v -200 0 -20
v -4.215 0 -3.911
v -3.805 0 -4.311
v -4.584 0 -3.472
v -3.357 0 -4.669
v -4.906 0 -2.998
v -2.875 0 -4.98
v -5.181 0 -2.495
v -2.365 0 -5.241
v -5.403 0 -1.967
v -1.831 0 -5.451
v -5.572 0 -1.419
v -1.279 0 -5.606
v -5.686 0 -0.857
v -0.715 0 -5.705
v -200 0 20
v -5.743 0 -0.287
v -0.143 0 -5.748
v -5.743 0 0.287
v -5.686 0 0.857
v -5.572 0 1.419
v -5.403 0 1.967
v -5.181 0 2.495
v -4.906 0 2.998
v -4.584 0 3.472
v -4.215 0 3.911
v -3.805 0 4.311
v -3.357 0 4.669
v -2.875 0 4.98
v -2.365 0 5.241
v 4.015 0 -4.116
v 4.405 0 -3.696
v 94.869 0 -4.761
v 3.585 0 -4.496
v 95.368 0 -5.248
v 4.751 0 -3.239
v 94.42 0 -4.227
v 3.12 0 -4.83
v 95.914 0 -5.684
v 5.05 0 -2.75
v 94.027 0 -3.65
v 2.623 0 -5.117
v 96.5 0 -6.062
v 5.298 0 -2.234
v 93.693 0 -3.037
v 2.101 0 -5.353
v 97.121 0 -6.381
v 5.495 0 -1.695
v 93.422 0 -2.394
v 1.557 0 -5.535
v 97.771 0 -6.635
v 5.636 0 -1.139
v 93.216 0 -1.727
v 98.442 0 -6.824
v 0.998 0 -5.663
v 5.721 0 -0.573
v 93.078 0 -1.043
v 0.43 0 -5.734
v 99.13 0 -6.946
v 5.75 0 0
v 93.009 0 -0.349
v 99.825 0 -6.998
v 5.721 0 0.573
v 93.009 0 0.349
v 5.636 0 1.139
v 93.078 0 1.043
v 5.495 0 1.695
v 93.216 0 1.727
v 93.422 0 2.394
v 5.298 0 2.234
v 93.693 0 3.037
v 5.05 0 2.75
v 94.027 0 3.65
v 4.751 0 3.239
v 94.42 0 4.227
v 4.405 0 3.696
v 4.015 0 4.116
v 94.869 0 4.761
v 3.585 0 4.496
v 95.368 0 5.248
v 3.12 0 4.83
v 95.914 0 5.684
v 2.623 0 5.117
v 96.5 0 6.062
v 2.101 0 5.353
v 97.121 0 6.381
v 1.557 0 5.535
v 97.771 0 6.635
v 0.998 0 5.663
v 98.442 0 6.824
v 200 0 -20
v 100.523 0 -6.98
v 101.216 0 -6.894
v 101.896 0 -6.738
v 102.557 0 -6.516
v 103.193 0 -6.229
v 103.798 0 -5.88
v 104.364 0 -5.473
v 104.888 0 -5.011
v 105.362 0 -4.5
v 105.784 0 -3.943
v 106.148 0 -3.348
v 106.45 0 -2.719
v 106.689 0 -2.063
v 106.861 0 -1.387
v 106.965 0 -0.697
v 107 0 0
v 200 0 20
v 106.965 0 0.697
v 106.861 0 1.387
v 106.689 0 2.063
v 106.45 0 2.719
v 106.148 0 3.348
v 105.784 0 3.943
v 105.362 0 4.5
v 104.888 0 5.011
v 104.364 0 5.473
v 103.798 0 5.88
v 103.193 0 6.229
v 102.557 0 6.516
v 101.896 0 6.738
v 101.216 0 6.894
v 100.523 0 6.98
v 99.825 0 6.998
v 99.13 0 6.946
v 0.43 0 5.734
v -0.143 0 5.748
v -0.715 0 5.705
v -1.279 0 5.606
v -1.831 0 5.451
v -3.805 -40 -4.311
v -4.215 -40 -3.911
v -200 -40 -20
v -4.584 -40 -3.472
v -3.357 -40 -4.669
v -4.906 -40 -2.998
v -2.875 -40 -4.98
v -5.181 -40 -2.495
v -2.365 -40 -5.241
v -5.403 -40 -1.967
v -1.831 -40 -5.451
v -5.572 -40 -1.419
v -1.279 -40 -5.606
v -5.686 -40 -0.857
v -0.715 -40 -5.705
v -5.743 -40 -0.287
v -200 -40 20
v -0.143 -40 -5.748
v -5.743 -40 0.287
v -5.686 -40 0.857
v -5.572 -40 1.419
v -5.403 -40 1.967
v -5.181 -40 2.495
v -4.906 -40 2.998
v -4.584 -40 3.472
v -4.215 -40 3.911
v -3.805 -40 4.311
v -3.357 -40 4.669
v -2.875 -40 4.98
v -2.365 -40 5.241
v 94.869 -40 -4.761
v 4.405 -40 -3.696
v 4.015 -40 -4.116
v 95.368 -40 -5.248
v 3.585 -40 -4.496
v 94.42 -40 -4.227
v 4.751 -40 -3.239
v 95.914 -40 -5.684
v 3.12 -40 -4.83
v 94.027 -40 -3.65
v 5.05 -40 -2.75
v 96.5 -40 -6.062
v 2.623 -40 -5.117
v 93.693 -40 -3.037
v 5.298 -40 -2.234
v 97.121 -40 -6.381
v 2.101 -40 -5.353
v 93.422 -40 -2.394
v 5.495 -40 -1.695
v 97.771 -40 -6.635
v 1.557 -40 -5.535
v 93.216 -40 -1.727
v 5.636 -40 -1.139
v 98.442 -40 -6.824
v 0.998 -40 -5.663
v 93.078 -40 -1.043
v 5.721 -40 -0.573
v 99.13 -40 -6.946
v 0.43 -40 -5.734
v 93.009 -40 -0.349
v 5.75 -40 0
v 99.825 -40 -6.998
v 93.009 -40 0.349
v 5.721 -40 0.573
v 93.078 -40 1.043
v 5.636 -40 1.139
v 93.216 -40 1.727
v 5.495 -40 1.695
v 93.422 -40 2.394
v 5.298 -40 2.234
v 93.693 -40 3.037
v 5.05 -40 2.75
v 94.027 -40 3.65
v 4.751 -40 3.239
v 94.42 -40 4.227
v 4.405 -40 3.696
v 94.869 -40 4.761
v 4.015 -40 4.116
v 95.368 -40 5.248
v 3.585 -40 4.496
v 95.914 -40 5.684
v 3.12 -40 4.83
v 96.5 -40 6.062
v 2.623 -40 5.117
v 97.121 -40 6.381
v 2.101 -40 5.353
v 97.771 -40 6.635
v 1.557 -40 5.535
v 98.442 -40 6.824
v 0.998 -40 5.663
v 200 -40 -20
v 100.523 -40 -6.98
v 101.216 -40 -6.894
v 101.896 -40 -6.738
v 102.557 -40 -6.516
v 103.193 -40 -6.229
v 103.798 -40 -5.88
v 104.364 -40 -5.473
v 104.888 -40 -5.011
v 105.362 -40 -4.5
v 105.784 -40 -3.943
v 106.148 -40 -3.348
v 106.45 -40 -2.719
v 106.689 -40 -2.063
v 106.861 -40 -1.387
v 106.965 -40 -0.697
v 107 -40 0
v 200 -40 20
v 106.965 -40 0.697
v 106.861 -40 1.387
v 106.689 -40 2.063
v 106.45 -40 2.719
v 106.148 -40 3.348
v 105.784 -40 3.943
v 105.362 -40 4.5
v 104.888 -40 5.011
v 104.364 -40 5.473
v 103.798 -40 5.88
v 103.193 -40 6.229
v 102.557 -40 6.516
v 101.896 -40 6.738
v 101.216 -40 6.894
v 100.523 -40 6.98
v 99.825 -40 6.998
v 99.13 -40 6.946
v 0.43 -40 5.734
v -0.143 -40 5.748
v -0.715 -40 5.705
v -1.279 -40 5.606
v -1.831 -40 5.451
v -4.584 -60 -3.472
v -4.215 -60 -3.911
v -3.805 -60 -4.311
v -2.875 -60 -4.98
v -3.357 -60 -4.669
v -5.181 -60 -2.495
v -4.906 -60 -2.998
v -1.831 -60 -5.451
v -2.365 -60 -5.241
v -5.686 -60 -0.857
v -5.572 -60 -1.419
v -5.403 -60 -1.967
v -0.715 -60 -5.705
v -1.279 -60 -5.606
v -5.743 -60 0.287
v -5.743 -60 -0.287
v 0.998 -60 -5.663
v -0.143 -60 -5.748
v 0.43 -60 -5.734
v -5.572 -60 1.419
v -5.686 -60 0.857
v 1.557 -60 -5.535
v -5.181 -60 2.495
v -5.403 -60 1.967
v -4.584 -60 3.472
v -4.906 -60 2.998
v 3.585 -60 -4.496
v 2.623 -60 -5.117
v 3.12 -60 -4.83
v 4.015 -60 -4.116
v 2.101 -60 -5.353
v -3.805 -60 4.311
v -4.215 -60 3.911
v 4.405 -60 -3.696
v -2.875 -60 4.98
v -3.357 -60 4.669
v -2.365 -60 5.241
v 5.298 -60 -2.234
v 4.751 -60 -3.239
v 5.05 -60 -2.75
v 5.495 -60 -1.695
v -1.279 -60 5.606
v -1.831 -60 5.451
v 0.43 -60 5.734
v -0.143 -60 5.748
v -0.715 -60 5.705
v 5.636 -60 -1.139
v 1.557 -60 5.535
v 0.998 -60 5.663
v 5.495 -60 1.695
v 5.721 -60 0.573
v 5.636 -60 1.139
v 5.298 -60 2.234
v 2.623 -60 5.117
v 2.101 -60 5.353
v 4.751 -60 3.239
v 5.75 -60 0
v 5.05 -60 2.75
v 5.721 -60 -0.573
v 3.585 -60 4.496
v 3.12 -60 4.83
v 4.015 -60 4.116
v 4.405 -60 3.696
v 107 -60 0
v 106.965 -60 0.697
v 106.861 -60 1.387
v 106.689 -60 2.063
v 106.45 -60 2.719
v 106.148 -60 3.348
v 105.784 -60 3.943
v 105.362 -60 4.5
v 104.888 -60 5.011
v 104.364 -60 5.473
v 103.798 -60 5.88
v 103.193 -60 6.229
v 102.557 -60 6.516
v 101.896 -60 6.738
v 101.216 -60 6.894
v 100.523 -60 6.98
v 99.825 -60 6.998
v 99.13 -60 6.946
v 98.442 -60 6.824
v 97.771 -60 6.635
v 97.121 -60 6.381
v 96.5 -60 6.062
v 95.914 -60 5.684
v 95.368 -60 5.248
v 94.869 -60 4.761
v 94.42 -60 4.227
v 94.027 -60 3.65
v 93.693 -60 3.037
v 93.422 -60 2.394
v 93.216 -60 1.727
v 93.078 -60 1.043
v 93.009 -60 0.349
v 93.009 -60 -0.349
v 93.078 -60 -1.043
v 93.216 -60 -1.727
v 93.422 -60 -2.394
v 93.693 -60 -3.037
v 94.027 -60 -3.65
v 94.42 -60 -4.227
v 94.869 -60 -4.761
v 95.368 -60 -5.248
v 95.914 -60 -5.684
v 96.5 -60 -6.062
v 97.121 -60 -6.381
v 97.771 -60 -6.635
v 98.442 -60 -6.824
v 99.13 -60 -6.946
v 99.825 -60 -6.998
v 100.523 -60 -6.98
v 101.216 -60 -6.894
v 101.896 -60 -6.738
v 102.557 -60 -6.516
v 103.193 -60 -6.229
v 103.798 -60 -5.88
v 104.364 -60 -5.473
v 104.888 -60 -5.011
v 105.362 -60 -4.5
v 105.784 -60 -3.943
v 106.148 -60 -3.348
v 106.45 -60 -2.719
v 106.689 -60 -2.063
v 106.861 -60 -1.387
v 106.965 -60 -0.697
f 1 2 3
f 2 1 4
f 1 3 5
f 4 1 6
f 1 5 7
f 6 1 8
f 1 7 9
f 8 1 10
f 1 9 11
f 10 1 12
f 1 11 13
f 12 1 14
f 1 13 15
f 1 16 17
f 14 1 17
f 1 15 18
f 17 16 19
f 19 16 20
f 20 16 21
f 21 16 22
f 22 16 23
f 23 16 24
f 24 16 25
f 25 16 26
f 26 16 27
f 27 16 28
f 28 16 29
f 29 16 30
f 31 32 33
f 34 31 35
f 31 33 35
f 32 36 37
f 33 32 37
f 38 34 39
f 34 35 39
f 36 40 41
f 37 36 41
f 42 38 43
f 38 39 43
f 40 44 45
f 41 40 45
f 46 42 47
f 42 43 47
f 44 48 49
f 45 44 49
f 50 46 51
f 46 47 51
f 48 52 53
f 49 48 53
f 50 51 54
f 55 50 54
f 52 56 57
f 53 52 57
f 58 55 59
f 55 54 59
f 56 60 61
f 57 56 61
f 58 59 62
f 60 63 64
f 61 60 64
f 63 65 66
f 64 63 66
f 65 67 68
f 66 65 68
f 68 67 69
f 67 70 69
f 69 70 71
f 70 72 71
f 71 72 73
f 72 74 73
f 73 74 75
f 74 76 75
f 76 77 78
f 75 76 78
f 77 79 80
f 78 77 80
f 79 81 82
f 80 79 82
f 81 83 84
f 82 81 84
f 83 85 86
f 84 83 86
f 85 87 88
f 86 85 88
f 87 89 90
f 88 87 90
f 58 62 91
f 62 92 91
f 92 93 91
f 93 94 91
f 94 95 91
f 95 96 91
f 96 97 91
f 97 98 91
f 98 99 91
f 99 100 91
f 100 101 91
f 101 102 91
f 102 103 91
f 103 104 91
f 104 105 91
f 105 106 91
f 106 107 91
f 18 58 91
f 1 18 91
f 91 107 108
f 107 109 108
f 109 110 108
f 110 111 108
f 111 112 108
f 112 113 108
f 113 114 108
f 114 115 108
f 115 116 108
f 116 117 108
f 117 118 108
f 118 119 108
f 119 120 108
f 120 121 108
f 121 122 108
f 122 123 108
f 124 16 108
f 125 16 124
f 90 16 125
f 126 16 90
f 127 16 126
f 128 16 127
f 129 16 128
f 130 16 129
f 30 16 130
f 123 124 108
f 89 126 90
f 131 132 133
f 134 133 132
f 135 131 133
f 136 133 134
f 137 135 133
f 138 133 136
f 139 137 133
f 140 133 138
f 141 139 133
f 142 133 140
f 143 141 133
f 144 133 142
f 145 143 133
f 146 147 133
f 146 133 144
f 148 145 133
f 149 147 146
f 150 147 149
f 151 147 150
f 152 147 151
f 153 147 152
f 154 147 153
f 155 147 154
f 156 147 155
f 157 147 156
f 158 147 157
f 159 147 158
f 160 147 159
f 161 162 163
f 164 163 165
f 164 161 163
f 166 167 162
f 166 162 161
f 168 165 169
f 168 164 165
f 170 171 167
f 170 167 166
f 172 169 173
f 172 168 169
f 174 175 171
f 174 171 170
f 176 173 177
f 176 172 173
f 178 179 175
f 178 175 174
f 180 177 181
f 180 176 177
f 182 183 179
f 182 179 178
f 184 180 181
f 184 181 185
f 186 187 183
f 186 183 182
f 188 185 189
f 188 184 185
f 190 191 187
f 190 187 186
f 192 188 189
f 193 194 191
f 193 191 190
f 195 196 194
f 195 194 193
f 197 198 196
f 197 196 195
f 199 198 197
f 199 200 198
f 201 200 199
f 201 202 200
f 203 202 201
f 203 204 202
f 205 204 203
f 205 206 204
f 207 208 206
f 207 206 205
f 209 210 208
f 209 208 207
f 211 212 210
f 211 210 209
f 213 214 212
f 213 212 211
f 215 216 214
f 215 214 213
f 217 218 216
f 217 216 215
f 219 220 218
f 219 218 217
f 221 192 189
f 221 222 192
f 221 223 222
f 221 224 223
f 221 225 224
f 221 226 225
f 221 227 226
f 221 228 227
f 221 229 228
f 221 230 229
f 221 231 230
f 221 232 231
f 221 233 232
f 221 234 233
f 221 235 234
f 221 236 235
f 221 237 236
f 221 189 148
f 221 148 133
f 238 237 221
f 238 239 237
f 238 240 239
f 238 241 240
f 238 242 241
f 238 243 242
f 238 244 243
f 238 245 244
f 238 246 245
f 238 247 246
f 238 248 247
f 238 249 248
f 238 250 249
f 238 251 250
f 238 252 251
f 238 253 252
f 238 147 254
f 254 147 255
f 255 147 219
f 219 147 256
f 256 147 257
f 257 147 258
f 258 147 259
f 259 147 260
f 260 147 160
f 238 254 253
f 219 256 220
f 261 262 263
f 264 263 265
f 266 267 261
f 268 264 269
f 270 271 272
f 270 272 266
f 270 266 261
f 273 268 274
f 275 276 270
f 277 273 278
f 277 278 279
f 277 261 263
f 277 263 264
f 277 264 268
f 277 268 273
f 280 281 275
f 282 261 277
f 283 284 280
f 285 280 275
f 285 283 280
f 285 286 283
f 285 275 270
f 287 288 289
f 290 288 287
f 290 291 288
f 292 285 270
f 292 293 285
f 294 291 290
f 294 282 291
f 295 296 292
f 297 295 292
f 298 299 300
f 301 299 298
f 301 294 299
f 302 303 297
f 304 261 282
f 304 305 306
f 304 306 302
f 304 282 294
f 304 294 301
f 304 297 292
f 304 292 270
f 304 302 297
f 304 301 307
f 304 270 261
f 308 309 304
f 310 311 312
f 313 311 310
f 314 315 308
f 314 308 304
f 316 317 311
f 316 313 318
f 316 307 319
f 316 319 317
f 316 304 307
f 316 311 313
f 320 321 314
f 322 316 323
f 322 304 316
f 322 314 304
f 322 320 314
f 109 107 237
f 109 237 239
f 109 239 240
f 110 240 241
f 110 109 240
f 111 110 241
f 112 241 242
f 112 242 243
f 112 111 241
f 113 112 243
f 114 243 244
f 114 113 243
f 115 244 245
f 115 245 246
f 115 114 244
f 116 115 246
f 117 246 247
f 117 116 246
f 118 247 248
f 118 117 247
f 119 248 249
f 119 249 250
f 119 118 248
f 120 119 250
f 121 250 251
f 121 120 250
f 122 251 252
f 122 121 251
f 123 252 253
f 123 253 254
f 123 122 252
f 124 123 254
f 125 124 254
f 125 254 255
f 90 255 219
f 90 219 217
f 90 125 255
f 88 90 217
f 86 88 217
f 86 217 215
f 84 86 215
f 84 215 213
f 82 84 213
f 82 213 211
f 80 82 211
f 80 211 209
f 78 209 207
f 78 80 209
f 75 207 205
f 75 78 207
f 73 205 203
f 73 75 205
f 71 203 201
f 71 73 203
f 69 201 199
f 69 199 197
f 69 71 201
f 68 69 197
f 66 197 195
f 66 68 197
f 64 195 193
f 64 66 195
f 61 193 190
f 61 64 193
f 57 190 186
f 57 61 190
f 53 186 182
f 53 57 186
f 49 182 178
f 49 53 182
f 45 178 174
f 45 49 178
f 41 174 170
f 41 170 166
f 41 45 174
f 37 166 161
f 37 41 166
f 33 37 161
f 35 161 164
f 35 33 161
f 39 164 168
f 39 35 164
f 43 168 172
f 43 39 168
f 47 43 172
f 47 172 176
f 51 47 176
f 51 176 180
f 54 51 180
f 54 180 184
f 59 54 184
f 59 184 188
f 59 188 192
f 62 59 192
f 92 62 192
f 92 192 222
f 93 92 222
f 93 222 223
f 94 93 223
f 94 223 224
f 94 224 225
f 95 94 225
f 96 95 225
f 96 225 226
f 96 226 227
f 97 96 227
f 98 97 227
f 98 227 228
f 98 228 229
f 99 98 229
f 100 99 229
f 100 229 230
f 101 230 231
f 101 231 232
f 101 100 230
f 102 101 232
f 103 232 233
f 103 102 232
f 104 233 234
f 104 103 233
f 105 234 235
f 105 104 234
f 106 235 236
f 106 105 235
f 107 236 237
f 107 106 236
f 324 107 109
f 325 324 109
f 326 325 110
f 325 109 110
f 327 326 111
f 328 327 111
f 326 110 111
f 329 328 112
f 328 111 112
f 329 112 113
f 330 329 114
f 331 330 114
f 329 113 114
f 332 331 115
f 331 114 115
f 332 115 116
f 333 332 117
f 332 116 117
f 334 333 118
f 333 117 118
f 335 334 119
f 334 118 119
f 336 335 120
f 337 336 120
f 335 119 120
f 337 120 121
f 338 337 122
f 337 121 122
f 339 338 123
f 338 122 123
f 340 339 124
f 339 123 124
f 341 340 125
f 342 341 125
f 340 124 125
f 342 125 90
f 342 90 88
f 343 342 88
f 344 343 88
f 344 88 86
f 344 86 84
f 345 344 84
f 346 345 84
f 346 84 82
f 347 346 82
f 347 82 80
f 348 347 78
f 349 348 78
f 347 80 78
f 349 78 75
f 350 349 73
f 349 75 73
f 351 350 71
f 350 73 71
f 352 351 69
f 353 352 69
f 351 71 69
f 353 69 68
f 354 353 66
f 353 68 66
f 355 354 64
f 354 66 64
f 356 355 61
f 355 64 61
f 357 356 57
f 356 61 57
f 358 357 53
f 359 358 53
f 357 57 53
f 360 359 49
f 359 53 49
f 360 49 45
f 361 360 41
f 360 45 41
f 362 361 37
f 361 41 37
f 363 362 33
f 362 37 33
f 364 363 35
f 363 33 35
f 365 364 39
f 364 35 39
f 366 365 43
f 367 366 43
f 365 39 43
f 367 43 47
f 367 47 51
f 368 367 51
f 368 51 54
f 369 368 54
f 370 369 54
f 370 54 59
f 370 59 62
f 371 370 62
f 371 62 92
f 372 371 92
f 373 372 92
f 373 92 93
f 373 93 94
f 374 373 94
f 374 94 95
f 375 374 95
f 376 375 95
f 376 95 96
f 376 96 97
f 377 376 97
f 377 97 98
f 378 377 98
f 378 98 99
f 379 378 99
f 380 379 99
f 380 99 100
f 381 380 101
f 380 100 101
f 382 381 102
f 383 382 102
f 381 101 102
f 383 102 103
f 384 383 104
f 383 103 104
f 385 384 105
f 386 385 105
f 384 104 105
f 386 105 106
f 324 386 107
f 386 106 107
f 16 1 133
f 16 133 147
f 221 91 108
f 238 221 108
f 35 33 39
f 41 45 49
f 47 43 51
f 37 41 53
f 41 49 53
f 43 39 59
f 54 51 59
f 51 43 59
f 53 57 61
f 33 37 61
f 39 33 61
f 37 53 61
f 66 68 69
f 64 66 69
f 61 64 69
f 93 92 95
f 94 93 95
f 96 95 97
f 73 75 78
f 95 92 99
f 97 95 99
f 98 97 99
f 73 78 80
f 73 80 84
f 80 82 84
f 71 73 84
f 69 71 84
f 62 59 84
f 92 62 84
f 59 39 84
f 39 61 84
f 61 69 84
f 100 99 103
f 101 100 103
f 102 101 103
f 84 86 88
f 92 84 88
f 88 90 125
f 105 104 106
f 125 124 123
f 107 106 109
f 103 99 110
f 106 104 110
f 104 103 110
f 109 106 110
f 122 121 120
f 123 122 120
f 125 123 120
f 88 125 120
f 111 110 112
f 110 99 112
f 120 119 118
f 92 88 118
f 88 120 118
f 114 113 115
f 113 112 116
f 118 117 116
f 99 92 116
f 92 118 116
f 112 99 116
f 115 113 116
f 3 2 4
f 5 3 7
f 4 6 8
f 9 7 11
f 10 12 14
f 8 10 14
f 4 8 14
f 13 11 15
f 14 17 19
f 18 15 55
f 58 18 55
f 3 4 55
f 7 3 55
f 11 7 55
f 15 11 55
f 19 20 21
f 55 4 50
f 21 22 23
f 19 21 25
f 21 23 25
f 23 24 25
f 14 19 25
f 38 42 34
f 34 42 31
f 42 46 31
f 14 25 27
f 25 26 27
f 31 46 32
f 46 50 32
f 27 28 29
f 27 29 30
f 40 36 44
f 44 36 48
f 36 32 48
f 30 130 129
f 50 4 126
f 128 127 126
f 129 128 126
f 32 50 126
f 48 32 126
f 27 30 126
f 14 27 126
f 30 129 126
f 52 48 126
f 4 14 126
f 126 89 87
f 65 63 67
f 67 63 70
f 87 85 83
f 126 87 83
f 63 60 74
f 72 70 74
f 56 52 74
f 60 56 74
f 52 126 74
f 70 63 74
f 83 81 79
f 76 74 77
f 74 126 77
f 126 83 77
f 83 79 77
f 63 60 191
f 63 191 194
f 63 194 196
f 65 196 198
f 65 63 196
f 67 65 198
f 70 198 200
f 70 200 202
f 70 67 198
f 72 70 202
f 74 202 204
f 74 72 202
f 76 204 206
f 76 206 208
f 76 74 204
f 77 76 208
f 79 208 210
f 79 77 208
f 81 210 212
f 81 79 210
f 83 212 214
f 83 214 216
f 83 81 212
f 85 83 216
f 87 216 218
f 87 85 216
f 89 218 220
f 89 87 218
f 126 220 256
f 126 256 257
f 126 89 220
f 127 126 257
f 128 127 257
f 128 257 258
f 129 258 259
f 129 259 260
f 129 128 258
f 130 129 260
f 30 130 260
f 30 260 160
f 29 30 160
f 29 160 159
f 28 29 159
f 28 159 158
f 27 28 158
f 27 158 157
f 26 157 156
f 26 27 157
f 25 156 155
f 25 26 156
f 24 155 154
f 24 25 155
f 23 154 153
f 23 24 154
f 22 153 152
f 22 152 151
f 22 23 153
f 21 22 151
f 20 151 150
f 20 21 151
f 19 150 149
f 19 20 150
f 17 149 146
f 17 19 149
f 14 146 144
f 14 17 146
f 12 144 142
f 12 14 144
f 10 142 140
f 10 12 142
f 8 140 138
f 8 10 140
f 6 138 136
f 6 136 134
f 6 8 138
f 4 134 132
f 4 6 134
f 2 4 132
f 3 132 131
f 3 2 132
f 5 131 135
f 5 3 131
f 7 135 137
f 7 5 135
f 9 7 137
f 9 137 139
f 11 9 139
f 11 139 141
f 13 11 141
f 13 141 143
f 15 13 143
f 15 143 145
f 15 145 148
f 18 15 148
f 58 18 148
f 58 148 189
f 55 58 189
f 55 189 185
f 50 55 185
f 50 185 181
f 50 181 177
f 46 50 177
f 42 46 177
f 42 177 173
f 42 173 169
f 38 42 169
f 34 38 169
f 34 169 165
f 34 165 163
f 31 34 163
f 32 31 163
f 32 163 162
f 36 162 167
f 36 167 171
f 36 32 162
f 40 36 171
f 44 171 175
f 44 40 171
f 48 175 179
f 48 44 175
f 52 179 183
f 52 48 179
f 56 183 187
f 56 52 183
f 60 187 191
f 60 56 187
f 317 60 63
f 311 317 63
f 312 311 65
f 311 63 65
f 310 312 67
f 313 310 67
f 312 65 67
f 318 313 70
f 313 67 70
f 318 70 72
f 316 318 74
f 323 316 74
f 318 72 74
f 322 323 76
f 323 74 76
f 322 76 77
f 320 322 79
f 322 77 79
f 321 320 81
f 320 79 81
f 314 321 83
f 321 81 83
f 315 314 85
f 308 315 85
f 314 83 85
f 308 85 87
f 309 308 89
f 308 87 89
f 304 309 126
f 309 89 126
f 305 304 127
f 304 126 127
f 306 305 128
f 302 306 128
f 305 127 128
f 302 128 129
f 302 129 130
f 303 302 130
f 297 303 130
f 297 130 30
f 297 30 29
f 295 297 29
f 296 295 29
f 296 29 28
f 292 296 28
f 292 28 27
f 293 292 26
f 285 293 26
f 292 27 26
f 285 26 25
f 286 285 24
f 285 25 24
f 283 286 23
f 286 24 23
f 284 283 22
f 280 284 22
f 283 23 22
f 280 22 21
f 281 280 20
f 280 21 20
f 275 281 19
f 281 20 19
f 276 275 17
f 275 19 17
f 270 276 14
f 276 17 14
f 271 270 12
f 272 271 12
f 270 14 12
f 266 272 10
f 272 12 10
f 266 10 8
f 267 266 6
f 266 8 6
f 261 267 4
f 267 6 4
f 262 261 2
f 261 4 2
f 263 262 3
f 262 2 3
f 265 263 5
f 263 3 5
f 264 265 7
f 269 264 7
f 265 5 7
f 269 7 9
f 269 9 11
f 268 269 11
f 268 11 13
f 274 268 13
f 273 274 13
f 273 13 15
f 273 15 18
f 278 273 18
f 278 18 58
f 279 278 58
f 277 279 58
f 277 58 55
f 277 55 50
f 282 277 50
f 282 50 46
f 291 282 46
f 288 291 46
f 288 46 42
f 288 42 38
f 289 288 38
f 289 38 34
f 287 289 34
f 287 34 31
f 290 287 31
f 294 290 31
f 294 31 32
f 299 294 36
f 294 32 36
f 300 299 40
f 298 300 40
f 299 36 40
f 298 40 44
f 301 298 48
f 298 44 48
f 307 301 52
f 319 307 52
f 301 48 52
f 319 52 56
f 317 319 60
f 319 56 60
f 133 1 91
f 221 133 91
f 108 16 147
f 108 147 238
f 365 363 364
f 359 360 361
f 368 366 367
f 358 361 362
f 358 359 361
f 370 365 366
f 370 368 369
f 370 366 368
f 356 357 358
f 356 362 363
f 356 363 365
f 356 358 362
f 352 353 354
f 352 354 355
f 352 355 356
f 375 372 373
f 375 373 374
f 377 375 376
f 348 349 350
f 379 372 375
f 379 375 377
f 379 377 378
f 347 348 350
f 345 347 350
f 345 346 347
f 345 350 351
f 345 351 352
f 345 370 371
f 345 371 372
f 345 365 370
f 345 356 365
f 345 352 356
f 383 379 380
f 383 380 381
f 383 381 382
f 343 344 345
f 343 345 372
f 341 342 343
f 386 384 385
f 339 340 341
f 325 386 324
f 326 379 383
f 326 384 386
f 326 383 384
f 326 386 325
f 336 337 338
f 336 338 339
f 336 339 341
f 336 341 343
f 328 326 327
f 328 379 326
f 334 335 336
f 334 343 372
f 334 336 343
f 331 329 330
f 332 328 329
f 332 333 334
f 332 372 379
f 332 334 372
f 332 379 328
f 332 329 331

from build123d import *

# Parameters (mm, degrees)
F0_R     = 5.75
F0_R_2   = 7
F1_DEPTH = 60
F0_W     = 400
F0_H     = 40
F2_DEPTH = 40


with BuildPart() as f1:
    # F0 (on Front) → F1 (new body)
    with BuildSketch(Plane.XZ):
        Circle(F0_R)
        with Locations((100, 0)):
            Circle(F0_R_2)
    extrude(amount=F1_DEPTH)


with BuildPart() as f2:
    # F0 (on Front) → F2 (new body)
    with BuildSketch(Plane.XZ):
        Rectangle(F0_W, F0_H)
        Circle(F0_R, mode=Mode.SUBTRACT)
        with Locations((100, 0)):
            Circle(F0_R_2, mode=Mode.SUBTRACT)
    extrude(amount=F2_DEPTH)


solid = Compound([f1.part, f2.part])
